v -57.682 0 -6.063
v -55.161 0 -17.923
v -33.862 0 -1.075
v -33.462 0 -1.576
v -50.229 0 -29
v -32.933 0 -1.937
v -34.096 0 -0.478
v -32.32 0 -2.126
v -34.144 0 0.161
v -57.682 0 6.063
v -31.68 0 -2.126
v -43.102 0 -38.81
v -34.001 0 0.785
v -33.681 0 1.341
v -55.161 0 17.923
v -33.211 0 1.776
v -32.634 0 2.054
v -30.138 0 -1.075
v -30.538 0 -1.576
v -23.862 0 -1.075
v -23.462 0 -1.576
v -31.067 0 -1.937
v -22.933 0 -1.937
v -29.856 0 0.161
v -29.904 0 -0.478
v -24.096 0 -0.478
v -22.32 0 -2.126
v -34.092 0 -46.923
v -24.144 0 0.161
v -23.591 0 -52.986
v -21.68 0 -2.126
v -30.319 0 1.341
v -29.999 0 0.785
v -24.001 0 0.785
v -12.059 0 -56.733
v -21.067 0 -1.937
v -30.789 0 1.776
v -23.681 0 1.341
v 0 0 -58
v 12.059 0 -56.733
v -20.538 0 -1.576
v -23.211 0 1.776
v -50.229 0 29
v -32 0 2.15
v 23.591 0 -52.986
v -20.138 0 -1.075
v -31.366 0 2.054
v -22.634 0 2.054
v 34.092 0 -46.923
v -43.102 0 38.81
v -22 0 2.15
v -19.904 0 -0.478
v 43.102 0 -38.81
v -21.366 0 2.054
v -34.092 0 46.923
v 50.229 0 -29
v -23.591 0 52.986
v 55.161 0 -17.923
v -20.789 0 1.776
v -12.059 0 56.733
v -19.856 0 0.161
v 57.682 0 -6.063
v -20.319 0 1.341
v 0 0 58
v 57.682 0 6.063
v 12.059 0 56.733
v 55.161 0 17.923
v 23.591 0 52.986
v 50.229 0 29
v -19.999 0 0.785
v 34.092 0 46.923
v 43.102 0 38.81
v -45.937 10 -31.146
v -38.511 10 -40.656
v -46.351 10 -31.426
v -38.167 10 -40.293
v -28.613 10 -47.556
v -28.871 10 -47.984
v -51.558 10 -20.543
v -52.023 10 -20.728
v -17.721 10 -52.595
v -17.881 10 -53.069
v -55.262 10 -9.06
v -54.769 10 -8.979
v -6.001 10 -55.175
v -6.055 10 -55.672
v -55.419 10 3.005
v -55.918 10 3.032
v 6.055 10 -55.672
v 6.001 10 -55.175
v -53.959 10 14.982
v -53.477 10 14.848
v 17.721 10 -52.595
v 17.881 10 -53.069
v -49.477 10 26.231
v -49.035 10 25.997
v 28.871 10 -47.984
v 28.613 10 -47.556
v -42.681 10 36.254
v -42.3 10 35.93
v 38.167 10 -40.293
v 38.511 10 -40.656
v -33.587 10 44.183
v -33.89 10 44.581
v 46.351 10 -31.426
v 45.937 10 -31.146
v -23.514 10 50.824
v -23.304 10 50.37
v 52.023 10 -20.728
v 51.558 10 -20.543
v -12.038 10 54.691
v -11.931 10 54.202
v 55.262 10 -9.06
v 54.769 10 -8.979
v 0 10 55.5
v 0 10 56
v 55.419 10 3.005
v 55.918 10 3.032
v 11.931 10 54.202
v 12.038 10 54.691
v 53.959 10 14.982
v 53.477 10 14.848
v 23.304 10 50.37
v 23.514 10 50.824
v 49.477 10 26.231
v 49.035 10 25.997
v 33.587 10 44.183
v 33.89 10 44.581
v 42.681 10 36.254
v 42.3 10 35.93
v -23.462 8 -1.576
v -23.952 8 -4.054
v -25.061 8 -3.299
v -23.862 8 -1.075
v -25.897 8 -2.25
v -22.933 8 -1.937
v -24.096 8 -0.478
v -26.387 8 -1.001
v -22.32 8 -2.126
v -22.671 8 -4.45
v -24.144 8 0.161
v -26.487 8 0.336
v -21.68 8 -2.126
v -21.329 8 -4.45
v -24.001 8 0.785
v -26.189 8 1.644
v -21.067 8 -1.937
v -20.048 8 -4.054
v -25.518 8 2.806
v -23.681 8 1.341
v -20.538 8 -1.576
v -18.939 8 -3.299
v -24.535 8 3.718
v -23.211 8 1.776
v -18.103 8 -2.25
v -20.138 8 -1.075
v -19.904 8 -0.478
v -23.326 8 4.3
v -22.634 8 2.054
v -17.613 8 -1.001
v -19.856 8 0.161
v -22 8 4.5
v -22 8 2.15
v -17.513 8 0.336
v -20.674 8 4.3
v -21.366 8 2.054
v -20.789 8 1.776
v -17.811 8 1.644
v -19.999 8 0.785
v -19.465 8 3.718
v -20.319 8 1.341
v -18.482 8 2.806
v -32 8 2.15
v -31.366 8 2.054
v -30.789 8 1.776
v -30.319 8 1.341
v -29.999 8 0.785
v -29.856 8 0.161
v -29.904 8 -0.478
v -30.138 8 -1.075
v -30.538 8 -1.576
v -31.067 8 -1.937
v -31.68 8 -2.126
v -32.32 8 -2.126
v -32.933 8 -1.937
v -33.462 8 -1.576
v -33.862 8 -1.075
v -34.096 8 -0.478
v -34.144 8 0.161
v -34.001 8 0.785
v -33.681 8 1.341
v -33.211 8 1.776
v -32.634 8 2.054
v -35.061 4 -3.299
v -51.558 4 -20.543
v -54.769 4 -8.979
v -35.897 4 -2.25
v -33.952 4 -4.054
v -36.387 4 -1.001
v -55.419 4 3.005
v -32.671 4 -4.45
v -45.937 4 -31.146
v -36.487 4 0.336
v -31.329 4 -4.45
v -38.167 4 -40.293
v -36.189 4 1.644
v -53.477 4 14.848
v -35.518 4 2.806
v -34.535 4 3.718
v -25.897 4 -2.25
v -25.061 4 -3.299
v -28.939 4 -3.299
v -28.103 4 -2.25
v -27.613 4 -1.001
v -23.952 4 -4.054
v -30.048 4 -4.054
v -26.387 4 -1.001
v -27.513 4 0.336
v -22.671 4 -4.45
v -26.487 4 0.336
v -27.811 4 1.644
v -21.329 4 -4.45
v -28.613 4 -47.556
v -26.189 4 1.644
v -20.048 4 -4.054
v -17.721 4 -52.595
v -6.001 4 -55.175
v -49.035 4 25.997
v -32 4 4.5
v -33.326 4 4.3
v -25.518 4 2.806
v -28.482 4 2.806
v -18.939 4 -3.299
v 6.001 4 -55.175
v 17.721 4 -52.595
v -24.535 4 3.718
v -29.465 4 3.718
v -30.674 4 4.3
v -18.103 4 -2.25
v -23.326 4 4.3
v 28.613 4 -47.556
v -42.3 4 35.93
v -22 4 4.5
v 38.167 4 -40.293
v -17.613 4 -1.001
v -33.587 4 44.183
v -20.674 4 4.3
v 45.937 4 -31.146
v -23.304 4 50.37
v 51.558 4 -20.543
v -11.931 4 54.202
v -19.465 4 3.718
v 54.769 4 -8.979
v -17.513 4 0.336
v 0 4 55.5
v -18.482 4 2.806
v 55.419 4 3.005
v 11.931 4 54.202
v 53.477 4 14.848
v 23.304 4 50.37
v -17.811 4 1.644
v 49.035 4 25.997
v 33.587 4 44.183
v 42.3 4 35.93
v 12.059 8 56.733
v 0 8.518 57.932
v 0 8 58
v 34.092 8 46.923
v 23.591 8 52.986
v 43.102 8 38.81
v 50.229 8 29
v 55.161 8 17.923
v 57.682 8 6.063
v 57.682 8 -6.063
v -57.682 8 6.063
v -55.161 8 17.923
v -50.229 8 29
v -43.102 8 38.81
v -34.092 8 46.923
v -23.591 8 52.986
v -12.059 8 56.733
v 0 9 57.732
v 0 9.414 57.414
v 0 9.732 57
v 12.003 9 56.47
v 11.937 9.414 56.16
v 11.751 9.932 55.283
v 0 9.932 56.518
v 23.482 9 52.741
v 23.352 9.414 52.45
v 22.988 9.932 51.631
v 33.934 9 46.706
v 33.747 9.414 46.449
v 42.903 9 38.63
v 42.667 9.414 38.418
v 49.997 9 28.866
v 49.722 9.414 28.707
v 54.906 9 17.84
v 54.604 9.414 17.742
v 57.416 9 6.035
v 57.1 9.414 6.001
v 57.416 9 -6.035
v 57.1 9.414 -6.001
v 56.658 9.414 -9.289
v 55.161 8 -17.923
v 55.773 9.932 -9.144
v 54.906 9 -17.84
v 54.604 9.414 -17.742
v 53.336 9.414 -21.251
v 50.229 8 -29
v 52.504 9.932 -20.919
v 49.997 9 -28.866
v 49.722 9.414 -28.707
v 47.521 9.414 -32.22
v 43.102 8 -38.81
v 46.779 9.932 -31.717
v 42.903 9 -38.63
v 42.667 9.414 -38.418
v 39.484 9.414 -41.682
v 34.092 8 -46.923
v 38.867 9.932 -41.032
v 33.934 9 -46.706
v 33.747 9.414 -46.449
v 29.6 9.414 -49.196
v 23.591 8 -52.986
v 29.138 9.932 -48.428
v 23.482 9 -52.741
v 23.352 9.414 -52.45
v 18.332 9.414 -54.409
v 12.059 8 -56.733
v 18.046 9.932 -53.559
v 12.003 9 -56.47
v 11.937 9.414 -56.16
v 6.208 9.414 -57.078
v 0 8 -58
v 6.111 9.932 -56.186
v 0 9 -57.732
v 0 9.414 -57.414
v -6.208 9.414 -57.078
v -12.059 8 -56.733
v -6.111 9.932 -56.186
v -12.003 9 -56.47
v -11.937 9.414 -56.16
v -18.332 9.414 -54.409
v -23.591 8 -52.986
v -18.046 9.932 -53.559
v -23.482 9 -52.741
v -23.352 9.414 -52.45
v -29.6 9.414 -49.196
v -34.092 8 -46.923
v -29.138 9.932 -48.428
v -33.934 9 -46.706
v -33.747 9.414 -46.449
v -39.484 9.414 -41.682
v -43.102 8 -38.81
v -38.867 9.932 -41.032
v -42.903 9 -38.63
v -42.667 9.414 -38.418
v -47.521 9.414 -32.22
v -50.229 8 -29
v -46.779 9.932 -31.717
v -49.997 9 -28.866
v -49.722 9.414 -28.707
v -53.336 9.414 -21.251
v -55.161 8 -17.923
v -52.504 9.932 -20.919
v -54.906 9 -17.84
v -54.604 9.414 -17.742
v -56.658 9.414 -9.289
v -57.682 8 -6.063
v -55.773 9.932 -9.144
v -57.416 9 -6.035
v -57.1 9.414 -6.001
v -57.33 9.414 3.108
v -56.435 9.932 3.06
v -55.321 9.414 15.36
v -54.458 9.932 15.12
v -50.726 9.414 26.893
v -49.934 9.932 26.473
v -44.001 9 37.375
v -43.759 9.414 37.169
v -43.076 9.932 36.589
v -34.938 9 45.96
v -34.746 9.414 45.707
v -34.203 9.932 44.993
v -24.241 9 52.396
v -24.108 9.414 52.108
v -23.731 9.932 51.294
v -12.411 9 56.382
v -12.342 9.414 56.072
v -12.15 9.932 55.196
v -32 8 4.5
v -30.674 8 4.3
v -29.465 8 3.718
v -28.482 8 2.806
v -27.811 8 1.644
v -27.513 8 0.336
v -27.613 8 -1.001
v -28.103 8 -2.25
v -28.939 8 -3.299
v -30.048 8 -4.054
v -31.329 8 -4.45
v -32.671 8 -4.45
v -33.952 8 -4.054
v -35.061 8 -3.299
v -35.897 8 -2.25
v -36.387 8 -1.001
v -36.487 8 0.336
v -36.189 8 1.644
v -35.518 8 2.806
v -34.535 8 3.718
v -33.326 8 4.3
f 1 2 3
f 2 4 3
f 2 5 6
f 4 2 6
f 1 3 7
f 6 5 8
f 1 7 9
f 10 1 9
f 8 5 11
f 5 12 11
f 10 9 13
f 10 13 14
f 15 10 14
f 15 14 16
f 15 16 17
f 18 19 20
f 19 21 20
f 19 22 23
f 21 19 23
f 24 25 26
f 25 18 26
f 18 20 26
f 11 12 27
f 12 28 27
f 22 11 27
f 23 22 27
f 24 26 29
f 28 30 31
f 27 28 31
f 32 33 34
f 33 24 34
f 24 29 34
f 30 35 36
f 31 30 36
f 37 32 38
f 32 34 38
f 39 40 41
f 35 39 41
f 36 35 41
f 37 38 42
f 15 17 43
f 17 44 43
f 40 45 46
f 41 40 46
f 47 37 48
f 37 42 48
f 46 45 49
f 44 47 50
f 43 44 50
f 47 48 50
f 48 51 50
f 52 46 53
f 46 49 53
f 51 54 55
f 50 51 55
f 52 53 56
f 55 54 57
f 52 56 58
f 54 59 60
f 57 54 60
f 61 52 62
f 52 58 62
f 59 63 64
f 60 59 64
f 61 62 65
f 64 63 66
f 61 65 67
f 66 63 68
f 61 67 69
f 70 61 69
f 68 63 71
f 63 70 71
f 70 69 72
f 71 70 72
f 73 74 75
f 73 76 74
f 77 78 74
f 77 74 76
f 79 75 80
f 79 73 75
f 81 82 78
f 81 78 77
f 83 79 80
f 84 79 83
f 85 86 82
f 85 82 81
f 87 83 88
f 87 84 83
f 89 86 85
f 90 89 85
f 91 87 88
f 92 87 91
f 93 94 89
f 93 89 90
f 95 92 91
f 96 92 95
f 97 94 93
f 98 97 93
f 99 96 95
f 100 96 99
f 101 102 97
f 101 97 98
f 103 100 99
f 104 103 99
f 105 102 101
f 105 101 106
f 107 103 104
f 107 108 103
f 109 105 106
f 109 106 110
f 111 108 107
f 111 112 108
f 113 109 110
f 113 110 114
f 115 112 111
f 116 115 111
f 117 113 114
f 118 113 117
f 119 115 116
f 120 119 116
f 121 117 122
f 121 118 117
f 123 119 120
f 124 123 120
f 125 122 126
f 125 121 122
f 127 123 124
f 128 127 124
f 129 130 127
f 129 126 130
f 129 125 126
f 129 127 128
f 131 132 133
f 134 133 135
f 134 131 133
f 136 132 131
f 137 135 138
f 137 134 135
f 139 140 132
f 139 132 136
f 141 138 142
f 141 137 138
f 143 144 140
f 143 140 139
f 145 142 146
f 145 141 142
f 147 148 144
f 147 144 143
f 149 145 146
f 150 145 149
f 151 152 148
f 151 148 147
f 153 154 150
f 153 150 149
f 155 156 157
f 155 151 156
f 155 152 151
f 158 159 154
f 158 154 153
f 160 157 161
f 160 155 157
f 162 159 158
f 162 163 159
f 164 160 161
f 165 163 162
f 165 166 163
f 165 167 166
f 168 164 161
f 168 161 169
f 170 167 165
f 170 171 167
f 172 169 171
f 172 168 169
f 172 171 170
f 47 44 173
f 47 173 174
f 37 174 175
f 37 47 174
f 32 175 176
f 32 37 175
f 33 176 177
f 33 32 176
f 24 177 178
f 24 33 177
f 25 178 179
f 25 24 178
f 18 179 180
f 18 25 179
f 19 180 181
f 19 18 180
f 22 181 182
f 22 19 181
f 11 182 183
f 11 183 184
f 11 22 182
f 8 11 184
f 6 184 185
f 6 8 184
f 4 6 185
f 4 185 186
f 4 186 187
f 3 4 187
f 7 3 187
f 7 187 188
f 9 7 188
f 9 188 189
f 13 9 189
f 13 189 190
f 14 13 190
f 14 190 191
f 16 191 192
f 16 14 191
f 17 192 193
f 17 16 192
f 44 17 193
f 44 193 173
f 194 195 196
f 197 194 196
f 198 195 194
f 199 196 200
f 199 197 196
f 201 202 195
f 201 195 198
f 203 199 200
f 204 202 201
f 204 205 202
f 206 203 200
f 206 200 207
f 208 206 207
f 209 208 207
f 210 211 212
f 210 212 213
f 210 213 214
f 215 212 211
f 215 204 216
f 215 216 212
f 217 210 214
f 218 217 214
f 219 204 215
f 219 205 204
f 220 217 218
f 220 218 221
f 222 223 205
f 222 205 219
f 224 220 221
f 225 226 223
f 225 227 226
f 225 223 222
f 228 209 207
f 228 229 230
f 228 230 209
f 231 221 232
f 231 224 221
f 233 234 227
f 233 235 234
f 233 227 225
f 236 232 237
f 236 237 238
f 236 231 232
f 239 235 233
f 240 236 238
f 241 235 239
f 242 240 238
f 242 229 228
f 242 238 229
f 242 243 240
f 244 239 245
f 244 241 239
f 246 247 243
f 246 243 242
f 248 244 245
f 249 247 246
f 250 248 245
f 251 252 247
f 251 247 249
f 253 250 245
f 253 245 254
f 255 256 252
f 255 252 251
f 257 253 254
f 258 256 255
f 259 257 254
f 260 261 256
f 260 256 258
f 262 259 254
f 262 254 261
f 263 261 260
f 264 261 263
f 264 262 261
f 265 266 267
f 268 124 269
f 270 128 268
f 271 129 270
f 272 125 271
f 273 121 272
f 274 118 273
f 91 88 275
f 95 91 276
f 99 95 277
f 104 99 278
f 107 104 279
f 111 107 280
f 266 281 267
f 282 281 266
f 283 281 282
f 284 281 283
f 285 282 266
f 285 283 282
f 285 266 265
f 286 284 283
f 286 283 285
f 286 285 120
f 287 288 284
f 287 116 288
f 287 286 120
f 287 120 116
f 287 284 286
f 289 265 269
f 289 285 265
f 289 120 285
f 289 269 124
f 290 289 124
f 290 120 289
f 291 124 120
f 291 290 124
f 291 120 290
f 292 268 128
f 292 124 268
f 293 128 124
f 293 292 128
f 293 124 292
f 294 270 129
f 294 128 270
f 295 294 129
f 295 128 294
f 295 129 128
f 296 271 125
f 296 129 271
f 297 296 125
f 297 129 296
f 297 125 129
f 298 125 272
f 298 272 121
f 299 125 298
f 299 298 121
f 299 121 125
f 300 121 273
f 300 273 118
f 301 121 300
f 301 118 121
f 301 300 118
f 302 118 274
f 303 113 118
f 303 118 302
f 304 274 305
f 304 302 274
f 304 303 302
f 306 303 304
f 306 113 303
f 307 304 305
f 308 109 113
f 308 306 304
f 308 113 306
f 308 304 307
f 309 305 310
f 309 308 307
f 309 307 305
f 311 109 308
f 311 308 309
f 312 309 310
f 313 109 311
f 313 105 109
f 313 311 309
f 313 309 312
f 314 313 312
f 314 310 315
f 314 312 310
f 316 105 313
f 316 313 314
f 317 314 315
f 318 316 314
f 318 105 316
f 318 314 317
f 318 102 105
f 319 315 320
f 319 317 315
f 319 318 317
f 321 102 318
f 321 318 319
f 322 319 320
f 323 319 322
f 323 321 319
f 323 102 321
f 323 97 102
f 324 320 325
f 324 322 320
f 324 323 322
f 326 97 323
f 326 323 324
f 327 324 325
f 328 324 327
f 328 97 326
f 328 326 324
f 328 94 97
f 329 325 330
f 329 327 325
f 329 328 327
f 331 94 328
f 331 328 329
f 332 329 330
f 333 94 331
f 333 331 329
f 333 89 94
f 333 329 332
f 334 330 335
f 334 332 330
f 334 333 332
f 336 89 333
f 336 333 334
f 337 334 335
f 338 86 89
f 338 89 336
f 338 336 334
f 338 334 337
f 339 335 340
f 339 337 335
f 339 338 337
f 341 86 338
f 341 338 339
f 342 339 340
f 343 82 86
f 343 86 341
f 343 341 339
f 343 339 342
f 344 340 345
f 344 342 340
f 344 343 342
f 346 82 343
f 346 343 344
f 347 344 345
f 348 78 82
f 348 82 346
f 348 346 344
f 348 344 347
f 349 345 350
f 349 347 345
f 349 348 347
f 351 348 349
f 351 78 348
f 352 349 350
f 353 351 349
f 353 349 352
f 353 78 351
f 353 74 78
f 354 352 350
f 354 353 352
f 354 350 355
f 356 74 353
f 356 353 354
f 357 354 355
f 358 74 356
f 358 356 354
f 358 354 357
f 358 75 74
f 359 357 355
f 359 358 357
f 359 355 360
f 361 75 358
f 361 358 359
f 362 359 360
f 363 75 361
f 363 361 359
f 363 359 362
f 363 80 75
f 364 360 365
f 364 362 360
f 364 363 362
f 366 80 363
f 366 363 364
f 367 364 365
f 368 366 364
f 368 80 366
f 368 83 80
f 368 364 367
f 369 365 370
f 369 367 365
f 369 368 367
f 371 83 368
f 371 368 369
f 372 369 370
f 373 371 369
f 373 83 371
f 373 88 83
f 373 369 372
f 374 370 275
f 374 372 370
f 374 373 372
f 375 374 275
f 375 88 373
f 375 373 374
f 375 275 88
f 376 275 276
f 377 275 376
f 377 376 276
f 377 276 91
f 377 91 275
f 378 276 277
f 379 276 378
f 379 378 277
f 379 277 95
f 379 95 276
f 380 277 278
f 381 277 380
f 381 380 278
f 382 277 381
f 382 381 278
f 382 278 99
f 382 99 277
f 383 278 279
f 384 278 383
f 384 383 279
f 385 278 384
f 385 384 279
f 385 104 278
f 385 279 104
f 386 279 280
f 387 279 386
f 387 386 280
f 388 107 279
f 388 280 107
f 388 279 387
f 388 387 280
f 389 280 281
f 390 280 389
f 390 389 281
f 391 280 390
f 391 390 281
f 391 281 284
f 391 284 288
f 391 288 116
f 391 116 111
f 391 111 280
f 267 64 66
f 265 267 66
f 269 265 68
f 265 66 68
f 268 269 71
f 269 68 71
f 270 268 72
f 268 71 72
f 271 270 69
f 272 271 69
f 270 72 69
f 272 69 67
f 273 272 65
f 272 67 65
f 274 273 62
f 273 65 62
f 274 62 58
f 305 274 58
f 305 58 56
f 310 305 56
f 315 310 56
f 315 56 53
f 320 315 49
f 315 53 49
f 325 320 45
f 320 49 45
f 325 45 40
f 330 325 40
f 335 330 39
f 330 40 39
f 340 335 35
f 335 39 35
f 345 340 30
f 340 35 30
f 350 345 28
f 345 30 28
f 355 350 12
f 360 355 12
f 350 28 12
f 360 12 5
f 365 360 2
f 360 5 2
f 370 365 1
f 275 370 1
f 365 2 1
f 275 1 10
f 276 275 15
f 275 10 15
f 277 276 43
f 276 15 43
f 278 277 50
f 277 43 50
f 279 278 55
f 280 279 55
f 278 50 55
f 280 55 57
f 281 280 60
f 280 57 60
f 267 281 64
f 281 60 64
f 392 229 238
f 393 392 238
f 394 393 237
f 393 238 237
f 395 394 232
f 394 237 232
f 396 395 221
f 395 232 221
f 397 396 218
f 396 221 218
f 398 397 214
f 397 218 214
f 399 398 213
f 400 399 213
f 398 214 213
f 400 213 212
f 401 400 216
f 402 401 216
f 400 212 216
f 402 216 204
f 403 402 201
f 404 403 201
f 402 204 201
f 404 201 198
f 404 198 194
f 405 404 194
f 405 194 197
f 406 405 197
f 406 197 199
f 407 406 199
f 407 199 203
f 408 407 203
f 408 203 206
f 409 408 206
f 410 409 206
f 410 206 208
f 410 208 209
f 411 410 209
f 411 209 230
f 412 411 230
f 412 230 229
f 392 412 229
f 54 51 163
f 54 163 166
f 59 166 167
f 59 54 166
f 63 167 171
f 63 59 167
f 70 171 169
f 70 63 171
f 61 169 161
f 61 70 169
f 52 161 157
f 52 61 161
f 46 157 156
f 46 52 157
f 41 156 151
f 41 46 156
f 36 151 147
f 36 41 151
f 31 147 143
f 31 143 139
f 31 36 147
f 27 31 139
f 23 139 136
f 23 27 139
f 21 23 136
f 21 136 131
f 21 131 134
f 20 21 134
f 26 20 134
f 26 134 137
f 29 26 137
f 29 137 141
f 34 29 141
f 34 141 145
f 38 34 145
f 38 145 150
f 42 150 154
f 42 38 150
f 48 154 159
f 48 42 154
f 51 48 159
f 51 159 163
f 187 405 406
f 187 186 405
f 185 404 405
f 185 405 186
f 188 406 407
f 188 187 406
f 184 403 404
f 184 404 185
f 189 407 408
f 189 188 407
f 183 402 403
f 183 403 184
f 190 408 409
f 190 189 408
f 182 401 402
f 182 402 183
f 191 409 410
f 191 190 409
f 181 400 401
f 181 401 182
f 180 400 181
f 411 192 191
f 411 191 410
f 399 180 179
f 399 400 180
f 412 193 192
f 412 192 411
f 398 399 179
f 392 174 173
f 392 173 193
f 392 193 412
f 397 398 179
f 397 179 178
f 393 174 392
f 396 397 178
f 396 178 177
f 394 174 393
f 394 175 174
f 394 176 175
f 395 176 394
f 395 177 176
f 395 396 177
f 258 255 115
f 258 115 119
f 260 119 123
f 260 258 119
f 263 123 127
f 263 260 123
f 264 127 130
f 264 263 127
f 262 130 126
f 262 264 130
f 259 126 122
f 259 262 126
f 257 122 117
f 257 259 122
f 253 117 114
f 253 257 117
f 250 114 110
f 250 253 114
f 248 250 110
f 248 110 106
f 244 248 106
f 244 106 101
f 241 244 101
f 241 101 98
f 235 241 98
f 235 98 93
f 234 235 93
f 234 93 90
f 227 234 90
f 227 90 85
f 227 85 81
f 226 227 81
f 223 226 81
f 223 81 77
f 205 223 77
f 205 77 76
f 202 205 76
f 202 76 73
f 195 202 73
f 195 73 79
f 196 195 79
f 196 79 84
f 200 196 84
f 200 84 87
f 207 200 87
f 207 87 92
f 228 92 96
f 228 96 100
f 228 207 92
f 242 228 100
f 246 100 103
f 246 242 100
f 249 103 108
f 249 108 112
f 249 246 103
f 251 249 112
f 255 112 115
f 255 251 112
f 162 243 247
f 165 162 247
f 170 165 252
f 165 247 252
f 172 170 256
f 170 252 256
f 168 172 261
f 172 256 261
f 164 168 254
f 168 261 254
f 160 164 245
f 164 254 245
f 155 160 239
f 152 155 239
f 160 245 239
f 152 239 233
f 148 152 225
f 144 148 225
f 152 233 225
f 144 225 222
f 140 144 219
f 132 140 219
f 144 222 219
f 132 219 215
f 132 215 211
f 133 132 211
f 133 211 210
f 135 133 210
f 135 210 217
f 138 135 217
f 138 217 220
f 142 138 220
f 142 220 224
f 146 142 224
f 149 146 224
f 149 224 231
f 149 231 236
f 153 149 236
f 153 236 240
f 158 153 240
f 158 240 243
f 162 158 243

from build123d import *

# Parameters (mm, degrees)
SKETCH_1_R                       = 4.5
MOVING_POST_A_DEPTH              = 8
SKETCH_2_R                       = 58
CUP_PLATE_D116_T4_DEPTH          = 4
SKETCH_3_R                       = 4.5
MOVING_POST_B_DEPTH              = 8
SKETCH_4_R                       = 58
SKETCH_4_R_2                     = 55.5
DRIP_SKIRT_OD116_ID111_H10_DEPTH = 10
SKETCH_5_R                       = 2.15
M4_MOVING_MOUNT_CLEARANCE_DEPTH  = 8
CUP_TOP_OUTER_ROUND_R2_R         = 2


with BuildPart() as part:
    # 草图1 → Moving_post_A (new body)
    with BuildSketch(Plane(origin=(0, 0, 0), x_dir=(1, 0, 0), z_dir=(0, 1, 0))):
        with Locations(Location((-22, 0, 0), (0, 0, 270))):
            Circle(SKETCH_1_R)
    extrude(amount=MOVING_POST_A_DEPTH)

    # 草图2 → Cup_plate_D116_T4 (add)
    with BuildSketch(Plane(origin=(0, 0, 0), x_dir=(1, 0, 0), z_dir=(0, 1, 0))):
        with Locations(Location((0, 0, 0), (0, 0, 270))):
            Circle(SKETCH_2_R)
    extrude(amount=CUP_PLATE_D116_T4_DEPTH)

    # 草图3 → Moving_post_B (add)
    with BuildSketch(Plane(origin=(0, 0, 0), x_dir=(1, 0, 0), z_dir=(0, 1, 0))):
        with Locations(Location((-32, 0, 0), (0, 0, 270))):
            Circle(SKETCH_3_R)
    extrude(amount=MOVING_POST_B_DEPTH)

    # 草图4 → Drip_skirt_OD116_ID111_H10 (add)
    with BuildSketch(Plane(origin=(0, 0, 0), x_dir=(1, 0, 0), z_dir=(0, 1, 0))):
        with Locations(Location((0, 0, 0), (0, 0, 270))):
            Circle(SKETCH_4_R)
        with Locations(Location((0, 0, 0), (0, 0, 270))):
            Circle(SKETCH_4_R_2, mode=Mode.SUBTRACT)
    extrude(amount=DRIP_SKIRT_OD116_ID111_H10_DEPTH)

    # 草图5 → M4_moving_mount_clearance (cut)
    with BuildSketch(Plane(origin=(0, 0, 0), x_dir=(1, 0, 0), z_dir=(0, 1, 0))):
        with Locations(Location((-22, 0, 0), (0, 0, 270))):
            Circle(SKETCH_5_R)
        with Locations(Location((-32, 0, 0), (0, 0, 270))):
            Circle(SKETCH_5_R)
    extrude(amount=M4_MOVING_MOUNT_CLEARANCE_DEPTH, mode=Mode.SUBTRACT)

    # Cup_top_outer_round_R2
    cup_top_outer_round_r2_edges = [part.edges().sort_by_distance(p)[0] for p in [
        (0, 10, -58),
    ]]
    fillet(cup_top_outer_round_r2_edges, radius=CUP_TOP_OUTER_ROUND_R2_R)


solid = part.part
